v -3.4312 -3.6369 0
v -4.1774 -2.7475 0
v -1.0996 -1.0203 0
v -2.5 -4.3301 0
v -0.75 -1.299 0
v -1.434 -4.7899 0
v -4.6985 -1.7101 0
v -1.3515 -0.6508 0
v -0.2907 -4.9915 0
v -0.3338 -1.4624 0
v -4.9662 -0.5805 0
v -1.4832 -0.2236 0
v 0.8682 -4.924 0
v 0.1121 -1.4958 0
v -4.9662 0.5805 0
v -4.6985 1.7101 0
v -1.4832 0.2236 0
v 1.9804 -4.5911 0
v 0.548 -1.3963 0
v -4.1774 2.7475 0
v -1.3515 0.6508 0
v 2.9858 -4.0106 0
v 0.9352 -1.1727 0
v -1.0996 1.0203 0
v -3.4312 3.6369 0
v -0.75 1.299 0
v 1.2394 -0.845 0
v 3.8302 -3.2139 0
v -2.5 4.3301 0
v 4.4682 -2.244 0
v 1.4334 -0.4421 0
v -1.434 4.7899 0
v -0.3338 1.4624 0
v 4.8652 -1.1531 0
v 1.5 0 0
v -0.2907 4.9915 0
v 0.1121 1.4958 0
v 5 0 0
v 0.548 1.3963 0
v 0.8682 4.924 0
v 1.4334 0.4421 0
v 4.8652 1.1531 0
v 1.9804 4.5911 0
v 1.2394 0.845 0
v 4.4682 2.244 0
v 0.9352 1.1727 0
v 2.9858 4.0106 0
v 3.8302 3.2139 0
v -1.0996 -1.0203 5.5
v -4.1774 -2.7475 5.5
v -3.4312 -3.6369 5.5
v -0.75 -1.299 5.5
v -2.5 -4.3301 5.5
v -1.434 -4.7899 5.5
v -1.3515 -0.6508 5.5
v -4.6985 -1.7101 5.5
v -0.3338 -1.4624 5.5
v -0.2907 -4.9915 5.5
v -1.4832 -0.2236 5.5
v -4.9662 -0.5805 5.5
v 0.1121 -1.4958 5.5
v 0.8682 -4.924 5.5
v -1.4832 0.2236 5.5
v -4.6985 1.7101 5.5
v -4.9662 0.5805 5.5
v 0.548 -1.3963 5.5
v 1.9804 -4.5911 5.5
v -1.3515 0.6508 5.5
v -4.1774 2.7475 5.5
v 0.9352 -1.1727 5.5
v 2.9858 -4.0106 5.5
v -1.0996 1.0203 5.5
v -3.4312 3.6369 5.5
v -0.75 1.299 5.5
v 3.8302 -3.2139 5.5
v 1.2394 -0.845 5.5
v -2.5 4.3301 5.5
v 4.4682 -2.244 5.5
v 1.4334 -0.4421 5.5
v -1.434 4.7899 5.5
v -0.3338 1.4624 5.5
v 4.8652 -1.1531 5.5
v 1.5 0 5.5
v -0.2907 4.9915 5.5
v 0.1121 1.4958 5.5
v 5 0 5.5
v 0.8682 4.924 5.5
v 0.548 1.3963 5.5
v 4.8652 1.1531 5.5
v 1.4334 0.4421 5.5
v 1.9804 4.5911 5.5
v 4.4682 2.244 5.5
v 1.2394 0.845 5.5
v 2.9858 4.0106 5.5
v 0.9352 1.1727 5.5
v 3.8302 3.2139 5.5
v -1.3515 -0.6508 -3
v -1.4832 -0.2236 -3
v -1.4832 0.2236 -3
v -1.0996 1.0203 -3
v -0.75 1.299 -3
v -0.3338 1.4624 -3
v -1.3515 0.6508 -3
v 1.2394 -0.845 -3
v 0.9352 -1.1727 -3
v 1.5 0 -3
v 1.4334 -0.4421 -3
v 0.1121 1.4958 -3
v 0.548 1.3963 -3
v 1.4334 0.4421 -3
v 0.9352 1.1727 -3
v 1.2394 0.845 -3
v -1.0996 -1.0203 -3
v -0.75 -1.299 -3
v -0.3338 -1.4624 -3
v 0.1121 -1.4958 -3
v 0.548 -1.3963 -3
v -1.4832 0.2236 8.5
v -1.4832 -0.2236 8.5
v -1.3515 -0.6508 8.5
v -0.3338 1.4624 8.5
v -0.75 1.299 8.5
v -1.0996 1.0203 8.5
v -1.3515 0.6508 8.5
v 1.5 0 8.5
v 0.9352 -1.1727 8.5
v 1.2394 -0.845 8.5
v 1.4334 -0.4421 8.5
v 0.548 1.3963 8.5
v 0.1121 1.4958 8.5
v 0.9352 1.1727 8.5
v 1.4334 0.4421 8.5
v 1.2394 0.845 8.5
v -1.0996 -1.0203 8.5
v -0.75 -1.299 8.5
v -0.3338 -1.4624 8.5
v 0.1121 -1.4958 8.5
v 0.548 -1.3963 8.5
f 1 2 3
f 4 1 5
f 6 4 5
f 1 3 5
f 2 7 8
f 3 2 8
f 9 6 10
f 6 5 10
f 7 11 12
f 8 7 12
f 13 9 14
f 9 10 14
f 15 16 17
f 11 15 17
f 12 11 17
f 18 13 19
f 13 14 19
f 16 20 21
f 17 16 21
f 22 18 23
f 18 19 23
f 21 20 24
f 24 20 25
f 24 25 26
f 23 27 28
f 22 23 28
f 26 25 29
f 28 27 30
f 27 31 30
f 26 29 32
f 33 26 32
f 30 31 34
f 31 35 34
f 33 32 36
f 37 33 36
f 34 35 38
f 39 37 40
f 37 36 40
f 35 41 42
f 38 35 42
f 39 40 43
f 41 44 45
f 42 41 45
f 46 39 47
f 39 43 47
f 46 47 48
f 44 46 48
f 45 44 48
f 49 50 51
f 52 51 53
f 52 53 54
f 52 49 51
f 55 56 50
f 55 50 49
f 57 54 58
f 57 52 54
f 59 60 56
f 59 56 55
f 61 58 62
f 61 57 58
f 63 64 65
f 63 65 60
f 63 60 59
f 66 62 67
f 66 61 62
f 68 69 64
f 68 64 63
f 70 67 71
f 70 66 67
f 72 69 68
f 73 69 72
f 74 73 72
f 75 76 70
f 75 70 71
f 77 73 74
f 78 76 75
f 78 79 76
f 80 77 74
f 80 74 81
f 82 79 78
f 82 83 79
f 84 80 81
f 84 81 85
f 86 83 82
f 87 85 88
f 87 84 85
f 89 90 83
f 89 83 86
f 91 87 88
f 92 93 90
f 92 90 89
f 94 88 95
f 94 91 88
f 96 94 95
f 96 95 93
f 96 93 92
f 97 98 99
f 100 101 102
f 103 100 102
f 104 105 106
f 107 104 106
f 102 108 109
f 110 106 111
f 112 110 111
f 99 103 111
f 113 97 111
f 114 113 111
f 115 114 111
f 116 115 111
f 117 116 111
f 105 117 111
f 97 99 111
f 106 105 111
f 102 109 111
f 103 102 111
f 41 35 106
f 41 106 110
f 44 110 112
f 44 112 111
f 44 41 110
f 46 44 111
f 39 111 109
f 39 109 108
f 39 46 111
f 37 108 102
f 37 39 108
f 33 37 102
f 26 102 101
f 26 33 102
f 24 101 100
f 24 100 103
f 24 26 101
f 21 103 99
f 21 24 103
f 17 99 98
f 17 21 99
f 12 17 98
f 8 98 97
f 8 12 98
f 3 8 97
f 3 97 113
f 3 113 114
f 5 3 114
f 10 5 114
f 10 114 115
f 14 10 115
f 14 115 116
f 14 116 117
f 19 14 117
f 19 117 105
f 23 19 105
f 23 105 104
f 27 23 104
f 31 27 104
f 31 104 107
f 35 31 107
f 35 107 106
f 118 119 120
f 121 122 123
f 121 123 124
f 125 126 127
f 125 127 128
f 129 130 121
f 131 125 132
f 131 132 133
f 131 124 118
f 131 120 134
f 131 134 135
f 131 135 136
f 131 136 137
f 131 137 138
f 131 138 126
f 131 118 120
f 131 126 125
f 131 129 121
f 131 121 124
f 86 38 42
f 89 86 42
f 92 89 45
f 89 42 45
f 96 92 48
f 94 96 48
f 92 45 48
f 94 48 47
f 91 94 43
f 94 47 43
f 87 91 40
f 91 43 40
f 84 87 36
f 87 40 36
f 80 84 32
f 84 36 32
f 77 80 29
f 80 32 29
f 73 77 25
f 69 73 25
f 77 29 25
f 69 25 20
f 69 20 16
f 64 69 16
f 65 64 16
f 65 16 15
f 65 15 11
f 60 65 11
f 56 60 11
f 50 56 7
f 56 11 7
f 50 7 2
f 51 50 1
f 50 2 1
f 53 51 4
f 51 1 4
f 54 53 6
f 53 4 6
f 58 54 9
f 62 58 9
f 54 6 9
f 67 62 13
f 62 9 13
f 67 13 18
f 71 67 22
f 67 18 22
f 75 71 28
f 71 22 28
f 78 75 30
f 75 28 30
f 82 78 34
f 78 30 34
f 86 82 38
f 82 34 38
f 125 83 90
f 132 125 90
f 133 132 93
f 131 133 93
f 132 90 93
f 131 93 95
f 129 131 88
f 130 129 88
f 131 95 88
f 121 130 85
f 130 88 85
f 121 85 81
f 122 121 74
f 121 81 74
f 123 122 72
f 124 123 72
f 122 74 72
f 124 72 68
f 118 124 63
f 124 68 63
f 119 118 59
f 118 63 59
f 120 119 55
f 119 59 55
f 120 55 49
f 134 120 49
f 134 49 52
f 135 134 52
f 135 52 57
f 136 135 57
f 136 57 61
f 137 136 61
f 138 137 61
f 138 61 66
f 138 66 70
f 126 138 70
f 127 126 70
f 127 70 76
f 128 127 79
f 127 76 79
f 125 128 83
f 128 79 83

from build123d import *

# Parameters (mm, degrees)
SKETCH_R          = 5
PAD_DEPTH         = 5.5
SKETCH001_R       = 1.5
PAD001_DEPTH      = 3
PAD001_DEPTH_BACK = 8.5


with BuildPart() as part:
    # Sketch → Pad (new body)
    with BuildSketch(Plane.XY):
        Circle(SKETCH_R)
    extrude(amount=PAD_DEPTH)

    # Sketch001 → Pad001 (new body, two sides)
    with BuildSketch(Plane.XY.offset(5.5)) as pad001_sk:
        Circle(SKETCH001_R)
    extrude(amount=PAD001_DEPTH)
    extrude(pad001_sk.sketch, amount=-PAD001_DEPTH_BACK)


solid = part.part
